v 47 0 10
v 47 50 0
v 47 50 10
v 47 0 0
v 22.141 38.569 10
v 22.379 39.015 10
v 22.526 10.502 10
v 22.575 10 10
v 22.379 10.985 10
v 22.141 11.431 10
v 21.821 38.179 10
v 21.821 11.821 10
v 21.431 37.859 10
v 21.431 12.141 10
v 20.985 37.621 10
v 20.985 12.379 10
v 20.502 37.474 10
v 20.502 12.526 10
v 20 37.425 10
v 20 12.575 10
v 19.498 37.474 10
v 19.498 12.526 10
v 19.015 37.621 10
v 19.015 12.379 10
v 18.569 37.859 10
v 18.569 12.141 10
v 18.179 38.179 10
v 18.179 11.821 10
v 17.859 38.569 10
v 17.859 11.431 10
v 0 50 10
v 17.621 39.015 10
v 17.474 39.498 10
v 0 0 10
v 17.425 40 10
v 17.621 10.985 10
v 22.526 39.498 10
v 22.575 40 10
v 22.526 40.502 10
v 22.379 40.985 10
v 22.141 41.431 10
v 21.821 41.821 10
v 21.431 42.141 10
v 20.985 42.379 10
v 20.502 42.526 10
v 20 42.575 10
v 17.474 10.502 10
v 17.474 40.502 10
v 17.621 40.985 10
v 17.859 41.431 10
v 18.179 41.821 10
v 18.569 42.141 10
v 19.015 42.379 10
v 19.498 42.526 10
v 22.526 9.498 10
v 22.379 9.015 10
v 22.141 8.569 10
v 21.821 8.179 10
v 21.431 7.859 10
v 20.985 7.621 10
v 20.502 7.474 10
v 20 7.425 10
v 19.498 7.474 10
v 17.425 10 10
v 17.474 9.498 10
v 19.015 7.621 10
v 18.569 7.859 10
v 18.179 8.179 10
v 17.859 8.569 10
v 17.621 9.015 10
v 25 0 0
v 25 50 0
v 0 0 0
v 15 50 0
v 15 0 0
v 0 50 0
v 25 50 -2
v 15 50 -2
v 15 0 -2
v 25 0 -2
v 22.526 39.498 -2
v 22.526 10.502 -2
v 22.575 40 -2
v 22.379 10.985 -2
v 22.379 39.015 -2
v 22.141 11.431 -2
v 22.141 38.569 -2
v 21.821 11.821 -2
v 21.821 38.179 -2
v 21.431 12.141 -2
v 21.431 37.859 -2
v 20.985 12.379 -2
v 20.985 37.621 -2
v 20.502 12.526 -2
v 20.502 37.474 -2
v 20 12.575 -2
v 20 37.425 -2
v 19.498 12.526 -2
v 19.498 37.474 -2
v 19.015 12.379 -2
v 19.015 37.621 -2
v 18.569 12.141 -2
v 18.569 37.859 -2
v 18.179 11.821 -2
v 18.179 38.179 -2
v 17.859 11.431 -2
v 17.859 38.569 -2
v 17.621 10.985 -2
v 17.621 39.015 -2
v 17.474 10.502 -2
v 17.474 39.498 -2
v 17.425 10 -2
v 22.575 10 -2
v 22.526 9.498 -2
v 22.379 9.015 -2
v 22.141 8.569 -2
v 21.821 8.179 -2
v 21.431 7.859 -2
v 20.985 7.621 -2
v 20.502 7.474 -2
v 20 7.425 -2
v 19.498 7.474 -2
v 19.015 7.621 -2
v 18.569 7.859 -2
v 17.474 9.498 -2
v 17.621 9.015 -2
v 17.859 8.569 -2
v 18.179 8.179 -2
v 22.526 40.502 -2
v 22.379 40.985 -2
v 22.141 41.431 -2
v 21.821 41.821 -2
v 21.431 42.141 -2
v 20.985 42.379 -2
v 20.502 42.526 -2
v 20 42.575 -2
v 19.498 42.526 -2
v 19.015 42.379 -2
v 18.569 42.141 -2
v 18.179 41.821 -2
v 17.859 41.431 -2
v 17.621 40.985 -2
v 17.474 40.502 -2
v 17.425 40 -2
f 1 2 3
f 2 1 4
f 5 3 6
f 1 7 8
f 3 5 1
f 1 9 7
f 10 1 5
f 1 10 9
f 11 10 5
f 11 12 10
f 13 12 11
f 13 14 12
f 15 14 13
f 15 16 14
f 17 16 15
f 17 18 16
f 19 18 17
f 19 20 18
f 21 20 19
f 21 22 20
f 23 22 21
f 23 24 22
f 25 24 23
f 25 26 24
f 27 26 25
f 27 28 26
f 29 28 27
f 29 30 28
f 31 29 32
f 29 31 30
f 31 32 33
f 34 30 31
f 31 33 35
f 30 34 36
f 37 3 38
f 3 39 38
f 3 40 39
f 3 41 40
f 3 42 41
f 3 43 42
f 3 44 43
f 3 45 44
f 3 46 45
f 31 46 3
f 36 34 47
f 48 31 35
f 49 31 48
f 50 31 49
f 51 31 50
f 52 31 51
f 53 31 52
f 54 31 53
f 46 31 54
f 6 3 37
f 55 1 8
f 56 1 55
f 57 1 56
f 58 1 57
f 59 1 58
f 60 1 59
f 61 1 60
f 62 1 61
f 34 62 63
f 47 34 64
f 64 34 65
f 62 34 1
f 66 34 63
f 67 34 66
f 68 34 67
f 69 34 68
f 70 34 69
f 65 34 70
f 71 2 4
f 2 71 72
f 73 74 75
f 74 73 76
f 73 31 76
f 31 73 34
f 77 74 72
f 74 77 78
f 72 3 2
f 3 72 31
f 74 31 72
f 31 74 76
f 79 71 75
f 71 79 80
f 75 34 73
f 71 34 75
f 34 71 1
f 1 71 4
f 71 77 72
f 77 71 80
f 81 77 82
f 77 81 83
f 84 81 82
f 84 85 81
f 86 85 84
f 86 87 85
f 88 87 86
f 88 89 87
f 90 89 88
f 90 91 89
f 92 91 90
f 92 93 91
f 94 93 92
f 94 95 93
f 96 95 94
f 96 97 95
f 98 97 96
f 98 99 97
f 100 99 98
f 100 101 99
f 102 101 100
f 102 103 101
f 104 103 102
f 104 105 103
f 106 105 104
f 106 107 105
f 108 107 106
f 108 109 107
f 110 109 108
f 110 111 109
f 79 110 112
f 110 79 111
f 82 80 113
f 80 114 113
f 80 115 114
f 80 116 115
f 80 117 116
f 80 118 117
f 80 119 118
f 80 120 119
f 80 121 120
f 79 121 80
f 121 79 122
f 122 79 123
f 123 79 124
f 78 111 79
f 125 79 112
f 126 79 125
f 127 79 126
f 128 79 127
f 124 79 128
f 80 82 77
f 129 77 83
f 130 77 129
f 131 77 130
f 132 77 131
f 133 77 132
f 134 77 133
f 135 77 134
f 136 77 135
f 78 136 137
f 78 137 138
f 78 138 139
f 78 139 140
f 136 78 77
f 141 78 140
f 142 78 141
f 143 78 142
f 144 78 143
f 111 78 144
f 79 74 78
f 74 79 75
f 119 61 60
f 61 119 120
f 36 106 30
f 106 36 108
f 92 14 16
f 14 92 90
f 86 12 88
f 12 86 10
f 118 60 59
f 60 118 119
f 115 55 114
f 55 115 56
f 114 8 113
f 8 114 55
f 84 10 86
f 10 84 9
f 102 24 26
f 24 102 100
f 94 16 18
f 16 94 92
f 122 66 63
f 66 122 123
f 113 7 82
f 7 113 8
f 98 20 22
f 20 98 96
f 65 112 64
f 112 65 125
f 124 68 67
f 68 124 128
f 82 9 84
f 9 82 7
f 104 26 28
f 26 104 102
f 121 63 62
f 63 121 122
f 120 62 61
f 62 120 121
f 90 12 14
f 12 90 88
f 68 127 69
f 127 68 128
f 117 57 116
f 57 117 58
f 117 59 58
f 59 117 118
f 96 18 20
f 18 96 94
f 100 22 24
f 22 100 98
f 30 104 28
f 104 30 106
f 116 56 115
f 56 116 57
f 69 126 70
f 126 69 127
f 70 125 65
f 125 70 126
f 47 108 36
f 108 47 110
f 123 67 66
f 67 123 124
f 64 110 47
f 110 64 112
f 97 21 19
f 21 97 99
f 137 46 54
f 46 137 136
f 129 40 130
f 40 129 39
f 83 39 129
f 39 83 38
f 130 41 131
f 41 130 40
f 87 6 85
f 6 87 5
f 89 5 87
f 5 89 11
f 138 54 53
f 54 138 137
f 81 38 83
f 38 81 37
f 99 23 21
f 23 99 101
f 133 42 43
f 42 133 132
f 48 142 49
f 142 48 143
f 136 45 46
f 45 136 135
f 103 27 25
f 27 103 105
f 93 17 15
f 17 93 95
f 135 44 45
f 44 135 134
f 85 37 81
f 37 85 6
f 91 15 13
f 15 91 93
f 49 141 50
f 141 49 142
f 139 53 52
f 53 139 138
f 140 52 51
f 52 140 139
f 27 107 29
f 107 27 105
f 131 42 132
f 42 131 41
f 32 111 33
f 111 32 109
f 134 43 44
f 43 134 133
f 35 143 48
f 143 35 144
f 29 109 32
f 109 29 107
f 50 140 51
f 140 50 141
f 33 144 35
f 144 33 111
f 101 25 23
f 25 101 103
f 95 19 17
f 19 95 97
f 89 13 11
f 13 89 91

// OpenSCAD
difference() {
  union() {
    cube([47, 50, 10]);
    translate([15, 0, -2]) {
      cube([10, 50, 2]);
    }
  }
  translate([20,10,-2.1]) {
    cylinder(h=14, d=5.15, $fn=32);
  }
  translate([20,40,-2.1]) {
    cylinder(h=14, d=5.15, $fn=32);
  }
}
